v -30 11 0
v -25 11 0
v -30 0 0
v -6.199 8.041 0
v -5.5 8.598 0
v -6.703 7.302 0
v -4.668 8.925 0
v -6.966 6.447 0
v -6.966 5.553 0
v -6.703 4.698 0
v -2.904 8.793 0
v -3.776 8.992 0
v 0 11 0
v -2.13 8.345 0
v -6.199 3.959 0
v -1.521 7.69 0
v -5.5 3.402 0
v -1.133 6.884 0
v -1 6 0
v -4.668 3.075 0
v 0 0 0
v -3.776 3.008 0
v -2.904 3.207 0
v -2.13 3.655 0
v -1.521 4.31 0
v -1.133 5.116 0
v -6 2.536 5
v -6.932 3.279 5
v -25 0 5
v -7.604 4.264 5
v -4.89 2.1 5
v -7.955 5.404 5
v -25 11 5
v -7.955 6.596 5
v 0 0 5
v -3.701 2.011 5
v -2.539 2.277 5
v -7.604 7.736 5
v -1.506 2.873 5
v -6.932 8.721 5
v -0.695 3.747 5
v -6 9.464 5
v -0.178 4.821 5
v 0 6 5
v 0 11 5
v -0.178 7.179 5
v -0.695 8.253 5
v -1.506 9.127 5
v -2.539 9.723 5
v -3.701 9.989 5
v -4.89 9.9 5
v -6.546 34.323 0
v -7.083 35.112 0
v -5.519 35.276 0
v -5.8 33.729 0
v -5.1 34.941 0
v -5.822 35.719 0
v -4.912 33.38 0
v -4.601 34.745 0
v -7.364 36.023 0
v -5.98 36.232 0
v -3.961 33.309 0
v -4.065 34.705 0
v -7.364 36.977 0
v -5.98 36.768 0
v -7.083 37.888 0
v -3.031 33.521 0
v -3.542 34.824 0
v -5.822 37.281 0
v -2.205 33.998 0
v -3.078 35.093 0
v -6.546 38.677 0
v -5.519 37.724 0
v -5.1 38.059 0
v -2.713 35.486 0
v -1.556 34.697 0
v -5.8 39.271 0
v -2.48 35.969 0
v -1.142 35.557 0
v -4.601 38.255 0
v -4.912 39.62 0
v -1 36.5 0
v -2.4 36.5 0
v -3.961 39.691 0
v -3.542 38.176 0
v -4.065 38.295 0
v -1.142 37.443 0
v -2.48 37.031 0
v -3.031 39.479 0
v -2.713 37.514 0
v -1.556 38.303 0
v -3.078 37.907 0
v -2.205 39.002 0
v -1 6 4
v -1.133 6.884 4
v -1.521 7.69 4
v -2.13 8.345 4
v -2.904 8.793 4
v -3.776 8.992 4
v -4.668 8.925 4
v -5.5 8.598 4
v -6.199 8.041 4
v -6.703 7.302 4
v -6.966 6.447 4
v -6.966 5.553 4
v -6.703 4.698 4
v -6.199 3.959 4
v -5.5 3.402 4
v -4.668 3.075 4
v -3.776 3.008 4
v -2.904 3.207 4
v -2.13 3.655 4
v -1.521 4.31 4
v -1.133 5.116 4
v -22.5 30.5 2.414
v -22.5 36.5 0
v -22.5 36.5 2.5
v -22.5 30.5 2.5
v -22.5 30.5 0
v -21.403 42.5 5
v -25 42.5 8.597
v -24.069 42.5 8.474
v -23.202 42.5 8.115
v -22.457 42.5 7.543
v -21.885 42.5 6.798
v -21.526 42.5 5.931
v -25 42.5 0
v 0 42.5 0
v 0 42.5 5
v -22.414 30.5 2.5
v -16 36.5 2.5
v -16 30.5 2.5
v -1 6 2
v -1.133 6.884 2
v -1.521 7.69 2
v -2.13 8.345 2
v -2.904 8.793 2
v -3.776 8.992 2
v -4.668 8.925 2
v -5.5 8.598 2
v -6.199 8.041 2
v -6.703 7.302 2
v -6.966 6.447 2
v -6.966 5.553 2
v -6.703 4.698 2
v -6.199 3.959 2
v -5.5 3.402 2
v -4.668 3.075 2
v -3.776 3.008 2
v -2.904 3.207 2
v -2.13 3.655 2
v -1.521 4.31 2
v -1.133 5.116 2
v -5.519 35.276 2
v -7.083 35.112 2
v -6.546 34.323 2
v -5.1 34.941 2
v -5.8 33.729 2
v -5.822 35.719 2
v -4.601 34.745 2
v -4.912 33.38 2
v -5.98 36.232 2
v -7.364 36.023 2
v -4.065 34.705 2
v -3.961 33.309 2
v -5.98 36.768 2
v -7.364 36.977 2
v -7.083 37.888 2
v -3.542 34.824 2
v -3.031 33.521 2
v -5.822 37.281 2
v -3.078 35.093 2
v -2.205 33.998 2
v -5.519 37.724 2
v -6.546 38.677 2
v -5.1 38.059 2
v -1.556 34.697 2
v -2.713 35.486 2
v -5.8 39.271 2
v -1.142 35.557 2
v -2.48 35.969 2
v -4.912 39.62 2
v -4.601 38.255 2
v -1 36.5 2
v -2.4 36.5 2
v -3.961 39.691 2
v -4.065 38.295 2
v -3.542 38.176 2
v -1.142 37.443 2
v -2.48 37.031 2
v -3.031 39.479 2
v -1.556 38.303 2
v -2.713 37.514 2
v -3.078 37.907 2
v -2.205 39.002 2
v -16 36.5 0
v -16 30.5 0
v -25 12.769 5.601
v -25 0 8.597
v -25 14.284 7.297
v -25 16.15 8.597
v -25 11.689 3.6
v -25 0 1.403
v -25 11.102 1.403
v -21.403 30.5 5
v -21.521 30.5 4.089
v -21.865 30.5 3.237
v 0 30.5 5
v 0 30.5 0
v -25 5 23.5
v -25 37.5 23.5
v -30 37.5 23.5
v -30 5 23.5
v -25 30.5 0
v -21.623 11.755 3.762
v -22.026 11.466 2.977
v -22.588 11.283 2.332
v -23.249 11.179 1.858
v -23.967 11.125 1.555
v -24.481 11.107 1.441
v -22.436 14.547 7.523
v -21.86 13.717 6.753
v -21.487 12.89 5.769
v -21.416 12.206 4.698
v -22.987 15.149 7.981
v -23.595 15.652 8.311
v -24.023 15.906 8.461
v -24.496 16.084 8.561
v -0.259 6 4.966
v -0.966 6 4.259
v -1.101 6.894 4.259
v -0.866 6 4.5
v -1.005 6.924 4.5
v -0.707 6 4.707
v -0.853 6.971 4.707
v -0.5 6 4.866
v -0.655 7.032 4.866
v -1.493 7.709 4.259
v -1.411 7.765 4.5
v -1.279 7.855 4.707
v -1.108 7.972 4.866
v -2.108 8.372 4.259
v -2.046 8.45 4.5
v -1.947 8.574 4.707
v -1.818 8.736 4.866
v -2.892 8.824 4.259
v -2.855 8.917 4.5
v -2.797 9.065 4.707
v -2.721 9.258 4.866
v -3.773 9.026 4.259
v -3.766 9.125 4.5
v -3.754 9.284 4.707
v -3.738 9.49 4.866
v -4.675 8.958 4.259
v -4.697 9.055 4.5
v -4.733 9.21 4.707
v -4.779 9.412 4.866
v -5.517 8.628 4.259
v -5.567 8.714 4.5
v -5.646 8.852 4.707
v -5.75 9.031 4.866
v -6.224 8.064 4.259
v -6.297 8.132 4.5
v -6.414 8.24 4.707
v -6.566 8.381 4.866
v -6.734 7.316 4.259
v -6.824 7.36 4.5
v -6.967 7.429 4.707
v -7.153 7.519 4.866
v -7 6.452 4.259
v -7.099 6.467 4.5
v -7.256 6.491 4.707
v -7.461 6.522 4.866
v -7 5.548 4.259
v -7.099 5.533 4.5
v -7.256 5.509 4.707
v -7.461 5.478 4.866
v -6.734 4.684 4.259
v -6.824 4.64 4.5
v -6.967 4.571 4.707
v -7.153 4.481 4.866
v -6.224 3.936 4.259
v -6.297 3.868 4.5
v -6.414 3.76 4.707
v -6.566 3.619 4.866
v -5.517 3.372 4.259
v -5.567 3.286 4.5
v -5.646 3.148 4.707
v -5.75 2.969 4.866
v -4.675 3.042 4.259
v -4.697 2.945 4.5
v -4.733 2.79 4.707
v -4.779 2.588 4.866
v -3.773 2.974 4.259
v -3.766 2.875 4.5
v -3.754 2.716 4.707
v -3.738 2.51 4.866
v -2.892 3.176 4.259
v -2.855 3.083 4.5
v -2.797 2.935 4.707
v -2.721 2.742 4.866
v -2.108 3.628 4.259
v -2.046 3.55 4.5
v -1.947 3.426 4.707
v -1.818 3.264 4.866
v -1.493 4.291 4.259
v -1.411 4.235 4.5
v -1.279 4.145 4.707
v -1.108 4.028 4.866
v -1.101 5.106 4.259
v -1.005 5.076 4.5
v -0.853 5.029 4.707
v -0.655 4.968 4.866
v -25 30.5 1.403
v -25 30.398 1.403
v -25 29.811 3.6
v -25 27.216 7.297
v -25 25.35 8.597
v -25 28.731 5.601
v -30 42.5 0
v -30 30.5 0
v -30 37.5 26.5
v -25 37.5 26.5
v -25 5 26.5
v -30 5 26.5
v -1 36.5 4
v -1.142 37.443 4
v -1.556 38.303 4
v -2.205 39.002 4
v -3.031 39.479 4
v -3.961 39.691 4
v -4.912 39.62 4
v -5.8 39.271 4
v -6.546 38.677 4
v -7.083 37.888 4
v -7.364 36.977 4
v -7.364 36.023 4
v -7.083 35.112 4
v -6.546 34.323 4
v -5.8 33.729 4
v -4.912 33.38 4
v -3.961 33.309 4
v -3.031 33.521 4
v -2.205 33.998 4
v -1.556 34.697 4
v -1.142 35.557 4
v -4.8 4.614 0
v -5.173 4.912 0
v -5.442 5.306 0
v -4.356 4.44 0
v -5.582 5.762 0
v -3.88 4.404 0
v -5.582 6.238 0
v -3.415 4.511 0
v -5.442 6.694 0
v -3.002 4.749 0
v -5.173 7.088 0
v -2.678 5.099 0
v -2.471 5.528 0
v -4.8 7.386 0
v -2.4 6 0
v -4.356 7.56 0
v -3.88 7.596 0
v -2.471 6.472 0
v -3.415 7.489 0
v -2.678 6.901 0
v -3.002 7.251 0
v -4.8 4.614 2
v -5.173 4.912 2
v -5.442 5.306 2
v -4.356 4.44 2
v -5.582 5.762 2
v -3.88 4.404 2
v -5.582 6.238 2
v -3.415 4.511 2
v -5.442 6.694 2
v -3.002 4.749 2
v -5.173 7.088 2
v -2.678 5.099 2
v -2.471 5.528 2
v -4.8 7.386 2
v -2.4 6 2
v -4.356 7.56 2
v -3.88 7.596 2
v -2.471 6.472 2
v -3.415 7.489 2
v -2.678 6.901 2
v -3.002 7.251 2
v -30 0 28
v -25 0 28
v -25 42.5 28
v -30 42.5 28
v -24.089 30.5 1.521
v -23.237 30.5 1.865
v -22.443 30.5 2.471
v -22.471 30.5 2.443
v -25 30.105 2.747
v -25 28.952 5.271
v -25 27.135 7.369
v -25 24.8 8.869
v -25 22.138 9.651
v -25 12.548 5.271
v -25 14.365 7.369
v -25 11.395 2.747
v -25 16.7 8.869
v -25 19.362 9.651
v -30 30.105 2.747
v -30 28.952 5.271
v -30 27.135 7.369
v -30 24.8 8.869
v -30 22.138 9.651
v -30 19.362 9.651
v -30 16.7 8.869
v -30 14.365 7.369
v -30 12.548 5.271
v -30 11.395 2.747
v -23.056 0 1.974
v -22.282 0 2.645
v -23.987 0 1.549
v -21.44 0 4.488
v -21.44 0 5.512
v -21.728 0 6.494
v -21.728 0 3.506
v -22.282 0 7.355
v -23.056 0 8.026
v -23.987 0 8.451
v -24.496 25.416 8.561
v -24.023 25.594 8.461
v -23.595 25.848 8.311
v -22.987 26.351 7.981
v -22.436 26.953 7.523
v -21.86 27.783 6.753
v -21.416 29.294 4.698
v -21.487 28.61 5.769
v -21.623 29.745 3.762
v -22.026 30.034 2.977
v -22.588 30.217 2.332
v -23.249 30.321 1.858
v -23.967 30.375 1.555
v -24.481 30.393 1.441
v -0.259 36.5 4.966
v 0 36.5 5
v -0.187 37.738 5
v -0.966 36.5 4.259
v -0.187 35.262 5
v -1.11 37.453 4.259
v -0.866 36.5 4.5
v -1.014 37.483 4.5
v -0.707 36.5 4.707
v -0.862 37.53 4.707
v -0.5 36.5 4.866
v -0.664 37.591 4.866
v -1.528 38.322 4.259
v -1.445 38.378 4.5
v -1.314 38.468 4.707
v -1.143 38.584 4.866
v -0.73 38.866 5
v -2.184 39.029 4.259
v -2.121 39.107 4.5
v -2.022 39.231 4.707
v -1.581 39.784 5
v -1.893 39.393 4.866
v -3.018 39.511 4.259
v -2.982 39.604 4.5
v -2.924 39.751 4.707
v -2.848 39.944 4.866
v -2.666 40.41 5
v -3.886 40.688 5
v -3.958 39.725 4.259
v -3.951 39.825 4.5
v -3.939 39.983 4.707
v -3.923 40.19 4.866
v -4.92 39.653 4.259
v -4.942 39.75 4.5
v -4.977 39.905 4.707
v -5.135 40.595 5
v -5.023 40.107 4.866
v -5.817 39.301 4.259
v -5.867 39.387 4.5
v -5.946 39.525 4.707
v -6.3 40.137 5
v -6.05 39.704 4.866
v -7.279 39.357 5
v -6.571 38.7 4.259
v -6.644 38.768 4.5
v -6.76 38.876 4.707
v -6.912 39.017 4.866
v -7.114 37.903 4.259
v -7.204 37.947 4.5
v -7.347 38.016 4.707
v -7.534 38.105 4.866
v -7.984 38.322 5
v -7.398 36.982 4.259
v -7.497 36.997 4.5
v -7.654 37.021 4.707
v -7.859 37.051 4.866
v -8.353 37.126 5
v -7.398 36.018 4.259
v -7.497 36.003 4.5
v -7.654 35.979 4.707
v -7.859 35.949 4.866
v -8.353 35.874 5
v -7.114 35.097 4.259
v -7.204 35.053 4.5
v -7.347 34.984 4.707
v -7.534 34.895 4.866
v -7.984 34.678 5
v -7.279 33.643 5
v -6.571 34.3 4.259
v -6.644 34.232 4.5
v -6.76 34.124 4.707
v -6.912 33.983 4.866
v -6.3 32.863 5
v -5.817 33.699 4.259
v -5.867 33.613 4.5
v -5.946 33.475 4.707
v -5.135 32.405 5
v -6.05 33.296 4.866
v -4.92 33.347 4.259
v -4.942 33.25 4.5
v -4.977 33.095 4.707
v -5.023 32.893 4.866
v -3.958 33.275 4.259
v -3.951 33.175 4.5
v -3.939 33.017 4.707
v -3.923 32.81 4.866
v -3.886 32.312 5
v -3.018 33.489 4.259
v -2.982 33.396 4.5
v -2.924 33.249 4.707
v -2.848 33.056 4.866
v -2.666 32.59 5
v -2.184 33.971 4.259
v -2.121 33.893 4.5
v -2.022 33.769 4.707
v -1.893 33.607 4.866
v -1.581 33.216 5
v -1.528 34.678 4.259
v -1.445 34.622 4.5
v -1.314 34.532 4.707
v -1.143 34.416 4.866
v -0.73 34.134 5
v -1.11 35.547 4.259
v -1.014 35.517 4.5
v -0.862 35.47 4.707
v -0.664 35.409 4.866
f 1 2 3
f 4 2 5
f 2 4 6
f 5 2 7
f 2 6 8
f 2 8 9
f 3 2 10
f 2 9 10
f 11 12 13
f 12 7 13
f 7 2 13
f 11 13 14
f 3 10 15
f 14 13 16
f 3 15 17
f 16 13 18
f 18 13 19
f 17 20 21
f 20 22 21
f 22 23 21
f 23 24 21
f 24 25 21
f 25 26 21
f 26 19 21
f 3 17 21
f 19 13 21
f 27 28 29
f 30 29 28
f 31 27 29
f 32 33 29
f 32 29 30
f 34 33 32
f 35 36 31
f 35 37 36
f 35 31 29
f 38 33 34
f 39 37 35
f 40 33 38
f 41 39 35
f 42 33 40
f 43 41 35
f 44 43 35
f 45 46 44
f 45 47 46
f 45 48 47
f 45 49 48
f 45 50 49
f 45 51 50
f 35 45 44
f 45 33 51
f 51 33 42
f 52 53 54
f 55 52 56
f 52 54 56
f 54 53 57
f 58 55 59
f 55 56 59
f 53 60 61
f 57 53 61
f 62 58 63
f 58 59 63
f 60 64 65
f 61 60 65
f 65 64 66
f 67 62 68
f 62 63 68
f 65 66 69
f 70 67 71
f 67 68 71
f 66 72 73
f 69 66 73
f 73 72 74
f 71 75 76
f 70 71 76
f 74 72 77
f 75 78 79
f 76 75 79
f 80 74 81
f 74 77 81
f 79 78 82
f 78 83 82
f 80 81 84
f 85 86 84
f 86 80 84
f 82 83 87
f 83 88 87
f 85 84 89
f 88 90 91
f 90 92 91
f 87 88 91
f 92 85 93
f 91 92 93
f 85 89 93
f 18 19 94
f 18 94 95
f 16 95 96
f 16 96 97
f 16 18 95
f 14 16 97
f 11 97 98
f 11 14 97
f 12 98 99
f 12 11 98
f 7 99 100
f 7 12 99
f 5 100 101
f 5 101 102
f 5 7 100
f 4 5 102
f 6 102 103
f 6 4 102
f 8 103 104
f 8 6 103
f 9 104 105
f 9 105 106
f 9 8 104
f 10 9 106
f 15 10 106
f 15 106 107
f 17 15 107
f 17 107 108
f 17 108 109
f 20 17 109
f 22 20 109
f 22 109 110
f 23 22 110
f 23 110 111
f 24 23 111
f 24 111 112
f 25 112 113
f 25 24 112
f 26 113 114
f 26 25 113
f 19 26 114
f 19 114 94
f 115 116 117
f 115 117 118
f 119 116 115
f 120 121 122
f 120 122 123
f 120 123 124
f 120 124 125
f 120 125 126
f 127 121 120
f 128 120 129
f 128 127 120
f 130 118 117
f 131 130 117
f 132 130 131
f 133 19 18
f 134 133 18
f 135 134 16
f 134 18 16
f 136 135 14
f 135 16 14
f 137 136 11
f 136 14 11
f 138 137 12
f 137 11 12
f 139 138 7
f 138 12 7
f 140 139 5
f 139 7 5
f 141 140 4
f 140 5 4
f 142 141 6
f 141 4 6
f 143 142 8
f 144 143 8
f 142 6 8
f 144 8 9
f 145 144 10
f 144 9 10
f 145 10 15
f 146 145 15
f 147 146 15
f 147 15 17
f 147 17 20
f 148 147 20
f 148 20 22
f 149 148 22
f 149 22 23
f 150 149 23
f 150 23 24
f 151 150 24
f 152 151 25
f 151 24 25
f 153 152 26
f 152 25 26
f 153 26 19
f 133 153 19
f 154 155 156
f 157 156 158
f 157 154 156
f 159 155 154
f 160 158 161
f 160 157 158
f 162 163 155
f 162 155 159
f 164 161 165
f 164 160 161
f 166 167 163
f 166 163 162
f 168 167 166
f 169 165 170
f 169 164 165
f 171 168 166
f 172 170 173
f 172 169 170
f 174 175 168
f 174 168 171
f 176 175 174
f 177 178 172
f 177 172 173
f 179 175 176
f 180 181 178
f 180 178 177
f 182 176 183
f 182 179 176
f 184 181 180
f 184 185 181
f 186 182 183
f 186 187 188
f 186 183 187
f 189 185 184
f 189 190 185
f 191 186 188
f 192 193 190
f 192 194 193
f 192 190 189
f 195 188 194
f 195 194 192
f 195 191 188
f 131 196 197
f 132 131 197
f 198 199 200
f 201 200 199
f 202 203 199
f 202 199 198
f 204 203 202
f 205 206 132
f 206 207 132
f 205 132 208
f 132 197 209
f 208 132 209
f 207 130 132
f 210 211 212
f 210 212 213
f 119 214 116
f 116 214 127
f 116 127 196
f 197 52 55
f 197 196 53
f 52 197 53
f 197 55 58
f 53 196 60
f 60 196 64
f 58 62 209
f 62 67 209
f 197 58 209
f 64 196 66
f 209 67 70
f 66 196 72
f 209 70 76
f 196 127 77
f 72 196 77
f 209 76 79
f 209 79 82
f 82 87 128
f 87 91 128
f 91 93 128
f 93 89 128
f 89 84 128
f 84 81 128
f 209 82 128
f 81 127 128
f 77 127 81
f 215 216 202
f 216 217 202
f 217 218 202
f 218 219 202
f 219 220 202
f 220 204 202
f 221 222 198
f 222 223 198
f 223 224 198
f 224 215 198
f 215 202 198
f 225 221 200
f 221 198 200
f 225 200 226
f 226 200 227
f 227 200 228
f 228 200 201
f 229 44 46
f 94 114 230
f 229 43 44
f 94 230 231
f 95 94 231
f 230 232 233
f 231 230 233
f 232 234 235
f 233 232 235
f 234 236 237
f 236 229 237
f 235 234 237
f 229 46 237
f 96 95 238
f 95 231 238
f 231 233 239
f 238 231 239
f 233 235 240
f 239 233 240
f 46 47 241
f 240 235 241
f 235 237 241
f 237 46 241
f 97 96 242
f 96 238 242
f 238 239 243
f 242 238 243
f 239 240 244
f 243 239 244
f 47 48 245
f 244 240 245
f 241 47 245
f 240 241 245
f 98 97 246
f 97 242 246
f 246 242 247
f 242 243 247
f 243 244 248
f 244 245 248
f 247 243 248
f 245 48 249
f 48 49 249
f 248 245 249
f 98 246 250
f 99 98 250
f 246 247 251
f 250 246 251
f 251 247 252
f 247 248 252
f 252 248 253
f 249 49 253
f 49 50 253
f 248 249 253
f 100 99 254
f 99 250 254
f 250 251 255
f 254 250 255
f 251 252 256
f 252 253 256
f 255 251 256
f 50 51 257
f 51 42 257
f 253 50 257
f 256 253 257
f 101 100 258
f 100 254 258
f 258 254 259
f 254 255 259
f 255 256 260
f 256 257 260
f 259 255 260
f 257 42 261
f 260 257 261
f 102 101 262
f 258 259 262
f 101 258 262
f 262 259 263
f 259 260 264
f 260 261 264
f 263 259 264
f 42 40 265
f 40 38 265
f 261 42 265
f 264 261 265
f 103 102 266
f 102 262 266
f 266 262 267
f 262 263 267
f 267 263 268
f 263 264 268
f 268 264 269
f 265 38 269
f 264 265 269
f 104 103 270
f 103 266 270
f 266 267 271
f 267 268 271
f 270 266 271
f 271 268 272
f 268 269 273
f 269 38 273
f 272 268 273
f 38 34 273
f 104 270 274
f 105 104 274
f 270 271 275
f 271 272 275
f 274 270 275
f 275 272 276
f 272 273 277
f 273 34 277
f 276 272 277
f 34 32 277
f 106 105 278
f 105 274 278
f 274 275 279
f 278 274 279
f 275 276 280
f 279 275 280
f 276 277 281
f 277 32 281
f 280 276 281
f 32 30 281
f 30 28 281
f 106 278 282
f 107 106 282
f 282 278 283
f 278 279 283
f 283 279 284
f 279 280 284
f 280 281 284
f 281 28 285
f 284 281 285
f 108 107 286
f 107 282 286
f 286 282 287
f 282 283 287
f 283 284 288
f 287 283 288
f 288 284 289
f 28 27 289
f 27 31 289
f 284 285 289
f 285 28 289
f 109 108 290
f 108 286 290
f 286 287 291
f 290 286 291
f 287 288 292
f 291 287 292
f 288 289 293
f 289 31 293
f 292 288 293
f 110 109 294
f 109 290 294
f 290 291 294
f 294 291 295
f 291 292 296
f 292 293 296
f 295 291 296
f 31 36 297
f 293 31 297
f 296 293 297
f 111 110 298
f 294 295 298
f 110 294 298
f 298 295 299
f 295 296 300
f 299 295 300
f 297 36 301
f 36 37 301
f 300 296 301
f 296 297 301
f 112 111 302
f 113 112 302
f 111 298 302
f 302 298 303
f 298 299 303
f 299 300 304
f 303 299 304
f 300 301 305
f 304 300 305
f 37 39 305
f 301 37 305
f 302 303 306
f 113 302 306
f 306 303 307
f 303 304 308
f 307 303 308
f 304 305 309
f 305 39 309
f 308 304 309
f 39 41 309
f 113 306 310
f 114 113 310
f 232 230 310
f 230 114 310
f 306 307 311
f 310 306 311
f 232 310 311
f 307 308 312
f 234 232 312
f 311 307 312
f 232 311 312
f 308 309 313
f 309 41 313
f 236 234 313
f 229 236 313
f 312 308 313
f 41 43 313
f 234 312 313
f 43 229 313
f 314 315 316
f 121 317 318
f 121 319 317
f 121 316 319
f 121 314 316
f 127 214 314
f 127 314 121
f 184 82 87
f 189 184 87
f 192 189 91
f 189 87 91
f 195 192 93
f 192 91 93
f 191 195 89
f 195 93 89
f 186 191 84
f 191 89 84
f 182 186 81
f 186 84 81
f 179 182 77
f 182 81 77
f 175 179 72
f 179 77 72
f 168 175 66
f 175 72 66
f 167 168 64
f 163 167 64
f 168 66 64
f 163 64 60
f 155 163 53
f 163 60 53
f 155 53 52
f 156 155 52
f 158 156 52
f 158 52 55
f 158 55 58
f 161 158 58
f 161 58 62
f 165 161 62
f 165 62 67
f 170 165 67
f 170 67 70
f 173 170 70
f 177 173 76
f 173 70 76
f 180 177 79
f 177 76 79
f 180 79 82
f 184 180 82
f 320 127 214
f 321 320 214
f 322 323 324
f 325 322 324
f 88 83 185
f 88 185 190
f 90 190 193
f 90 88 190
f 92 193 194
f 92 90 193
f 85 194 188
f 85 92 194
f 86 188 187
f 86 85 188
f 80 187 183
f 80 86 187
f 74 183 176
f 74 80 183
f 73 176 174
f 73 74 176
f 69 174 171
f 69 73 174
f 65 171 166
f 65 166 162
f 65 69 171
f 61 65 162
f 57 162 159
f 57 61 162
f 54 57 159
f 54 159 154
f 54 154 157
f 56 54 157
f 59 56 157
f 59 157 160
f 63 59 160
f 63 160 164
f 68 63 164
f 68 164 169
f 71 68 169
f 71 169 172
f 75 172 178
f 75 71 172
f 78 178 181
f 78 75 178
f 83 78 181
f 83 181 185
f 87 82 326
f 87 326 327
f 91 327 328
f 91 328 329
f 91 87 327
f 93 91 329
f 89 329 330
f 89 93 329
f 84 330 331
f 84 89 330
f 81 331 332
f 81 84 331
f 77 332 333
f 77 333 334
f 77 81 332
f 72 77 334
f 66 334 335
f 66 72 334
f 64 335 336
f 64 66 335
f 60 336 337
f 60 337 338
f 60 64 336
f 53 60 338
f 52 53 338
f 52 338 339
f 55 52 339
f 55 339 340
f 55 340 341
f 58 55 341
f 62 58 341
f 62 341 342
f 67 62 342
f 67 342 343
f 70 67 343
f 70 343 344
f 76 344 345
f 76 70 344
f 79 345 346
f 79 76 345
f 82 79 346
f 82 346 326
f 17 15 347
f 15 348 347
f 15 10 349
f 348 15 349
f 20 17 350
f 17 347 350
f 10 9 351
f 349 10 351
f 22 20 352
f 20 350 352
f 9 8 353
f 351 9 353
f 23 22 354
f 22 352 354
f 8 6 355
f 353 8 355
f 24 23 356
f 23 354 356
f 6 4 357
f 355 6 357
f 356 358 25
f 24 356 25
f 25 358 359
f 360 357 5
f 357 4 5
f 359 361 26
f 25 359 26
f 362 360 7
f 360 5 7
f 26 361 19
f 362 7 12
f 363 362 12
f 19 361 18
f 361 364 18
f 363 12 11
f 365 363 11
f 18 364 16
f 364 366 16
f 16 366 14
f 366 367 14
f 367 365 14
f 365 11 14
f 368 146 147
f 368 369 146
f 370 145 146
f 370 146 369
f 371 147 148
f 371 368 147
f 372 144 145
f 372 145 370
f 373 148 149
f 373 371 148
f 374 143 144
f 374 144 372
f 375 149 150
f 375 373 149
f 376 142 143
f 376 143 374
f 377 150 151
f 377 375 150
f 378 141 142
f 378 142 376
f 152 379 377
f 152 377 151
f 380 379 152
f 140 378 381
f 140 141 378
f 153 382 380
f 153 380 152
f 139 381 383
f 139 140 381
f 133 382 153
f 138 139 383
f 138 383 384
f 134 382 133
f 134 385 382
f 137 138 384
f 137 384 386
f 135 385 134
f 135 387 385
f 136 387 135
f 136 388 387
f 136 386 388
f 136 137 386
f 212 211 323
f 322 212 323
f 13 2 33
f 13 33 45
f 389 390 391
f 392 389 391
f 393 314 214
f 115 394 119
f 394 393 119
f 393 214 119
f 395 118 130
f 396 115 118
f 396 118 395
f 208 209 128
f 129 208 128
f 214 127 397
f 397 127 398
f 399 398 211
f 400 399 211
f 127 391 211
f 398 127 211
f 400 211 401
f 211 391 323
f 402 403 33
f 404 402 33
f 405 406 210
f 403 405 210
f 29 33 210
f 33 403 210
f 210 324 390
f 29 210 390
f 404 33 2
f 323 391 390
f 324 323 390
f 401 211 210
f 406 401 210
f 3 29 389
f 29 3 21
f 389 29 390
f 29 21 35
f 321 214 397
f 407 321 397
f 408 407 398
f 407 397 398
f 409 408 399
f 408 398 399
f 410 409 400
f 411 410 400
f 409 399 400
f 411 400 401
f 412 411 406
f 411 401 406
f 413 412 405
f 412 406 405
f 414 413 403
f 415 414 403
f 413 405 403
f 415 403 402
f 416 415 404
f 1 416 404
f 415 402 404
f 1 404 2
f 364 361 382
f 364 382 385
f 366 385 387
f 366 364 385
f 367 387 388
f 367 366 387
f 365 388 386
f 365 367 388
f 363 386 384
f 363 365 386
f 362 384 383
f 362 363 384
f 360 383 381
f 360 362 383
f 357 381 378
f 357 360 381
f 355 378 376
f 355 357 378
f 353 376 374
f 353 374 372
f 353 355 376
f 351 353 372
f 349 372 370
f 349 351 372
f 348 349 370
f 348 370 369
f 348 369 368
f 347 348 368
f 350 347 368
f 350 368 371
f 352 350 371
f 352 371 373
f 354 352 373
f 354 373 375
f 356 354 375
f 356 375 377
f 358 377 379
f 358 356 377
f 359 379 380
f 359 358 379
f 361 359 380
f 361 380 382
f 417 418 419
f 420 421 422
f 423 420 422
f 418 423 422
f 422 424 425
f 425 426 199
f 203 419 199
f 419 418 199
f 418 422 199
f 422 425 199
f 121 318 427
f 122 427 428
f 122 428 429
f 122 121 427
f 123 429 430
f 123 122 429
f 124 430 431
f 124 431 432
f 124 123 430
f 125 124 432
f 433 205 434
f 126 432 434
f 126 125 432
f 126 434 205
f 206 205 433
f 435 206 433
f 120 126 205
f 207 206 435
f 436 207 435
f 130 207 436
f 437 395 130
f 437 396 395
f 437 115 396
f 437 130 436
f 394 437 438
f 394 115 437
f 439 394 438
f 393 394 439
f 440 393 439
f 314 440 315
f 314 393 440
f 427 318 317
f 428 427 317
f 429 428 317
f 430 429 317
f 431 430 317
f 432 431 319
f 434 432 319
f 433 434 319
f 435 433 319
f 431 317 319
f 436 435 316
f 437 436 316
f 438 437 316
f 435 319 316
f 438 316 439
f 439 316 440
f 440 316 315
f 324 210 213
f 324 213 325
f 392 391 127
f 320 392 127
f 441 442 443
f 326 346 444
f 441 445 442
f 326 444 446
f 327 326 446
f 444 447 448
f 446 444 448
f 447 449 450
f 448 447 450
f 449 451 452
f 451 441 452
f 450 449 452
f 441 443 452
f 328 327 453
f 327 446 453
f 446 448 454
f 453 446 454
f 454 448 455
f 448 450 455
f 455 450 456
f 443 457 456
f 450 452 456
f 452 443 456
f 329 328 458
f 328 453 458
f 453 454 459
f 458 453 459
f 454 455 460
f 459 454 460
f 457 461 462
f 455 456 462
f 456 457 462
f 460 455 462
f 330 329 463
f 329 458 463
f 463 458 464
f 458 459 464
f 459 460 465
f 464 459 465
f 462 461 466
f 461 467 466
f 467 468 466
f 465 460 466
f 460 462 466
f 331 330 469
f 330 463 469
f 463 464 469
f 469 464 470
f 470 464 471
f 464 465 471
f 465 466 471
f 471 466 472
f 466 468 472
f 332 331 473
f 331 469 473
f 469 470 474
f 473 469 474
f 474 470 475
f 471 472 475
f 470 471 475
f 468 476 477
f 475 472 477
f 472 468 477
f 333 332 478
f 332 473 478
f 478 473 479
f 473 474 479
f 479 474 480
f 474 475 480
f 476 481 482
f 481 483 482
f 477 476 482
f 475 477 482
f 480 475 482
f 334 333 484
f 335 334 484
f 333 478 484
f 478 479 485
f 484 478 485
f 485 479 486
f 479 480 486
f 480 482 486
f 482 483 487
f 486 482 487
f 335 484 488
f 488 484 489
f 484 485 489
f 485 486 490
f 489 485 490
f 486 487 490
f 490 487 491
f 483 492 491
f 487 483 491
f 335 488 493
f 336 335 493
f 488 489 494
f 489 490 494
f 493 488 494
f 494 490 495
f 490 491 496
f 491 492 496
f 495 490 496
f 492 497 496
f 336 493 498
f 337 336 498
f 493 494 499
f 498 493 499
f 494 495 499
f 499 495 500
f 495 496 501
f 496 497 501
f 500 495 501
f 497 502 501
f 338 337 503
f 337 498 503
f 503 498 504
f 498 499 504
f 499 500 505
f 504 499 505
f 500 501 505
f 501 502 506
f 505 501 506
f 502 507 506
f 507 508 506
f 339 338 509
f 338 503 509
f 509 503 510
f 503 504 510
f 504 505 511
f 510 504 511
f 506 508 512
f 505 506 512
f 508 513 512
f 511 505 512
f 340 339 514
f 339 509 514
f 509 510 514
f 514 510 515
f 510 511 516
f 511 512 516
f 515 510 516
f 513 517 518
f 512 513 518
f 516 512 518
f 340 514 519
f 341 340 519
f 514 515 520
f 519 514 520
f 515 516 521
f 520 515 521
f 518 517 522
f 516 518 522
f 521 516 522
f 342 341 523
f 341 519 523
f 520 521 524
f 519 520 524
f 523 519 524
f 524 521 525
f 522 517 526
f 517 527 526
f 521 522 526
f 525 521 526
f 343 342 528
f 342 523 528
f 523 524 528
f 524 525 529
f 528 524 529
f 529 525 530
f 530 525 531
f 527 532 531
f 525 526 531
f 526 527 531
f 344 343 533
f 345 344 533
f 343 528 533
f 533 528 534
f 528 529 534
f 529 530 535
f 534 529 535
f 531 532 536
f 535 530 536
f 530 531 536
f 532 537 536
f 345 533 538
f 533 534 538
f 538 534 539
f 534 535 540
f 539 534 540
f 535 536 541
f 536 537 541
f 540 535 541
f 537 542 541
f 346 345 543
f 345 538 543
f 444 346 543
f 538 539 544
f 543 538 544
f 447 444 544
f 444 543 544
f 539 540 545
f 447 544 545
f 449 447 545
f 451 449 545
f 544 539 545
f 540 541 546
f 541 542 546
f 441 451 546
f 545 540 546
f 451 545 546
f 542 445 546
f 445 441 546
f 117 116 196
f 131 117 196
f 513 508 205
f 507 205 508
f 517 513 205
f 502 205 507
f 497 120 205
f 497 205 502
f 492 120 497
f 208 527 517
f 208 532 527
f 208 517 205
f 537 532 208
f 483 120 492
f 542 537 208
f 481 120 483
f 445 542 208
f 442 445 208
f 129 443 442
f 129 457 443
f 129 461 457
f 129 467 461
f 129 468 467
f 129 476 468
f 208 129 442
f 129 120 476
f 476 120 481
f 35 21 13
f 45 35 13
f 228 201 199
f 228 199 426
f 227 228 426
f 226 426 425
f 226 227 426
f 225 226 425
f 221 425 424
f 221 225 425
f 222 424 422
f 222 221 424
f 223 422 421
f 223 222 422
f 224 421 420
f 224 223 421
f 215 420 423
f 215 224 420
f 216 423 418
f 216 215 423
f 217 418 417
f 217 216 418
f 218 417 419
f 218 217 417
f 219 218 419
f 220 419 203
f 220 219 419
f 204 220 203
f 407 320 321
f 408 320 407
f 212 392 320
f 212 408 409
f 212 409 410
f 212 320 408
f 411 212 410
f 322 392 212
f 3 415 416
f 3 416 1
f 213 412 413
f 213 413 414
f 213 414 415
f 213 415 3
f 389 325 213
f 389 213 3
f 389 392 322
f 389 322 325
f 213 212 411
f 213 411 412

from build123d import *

# Parameters (mm, degrees)
F0_W     = 25
F0_H     = 12
F0_R     = 3.2
F1_DEPTH = 5
F0_H_2   = 11
F0_R_2   = 3
F2_W     = 32.5
F2_H     = 3
F2_W_2   = 12
F2_H_2   = 5
F3_DEPTH = 5
F5_DEPTH = 42.5
F6_W     = 6.5
F6_H     = 6
F7_DEPTH = 2.5
F8_DEPTH = 25
F0_R_3   = 1.6
F9_DEPTH = 2
F0_R_4   = 1.8
F10_R    = 0.99999
F10_2_R  = 0.99999


# Not quite as in the source:
# - a fillet or chamfer is up to 0.001 mm smaller than in the source, because OpenCascade refuses the exact size


with BuildPart() as f1:
    # F0 (on Top) → F1 (new body)
    with BuildSketch(Plane.XY):
        with Locations((-12.5, 36.5)):
            Rectangle(F0_W, F0_H)
        with Locations((-4.2, 36.5)):
            Circle(F0_R, mode=Mode.SUBTRACT)
    extrude(amount=F1_DEPTH)

    # F4 (on face) → F5 (join, through all)
    with BuildSketch(Plane(origin=(0, 42.5, 0), x_dir=(-1, 0, 0), z_dir=(0, 1, 0))):
        with BuildLine():
            Line((25, 1.4033576227), (25, 8.5966423773))
            ThreePointArc((25, 8.5966423773), (21.4033576227, 5), (25, 1.4033576227))
        make_face()
    extrude(amount=-F5_DEPTH)

    # F6 (on face) → F7 (cut)
    with BuildSketch(Plane(origin=(0, 0, 0), x_dir=(1, 0, 0), z_dir=(0, 0, -1))):
        with Locations((-19.25, -33.5)):
            Rectangle(F6_W, F6_H)
    extrude(amount=-F7_DEPTH, mode=Mode.SUBTRACT)

    # F2 (on face) → F8 (cut)
    with BuildSketch(Plane(origin=(-25, 0, 0), x_dir=(0, -1, 0), z_dir=(-1, 0, 0))):
        with BuildLine():
            Line((-30.5, 0), (-11, 0))
            ThreePointArc((-11, 0), (-20.75, 9.75), (-30.5, 0))
        make_face()
    extrude(amount=-F8_DEPTH, mode=Mode.SUBTRACT)

    # F10 (radius 1 in the source; OpenCascade refuses exactly that, so slightly less here)
    f10_edges = [f1.edges().sort_by_distance(p)[0] for p in [
        (-7.4, 36.5, 5),
    ]]
    fillet(f10_edges, radius=F10_R)


with BuildPart() as f1b:
    # F0 (on Top) → F1, piece 2 (new body)
    with BuildSketch(Plane.XY):
        with Locations((-12.5, 5.5)):
            Rectangle(F0_W, F0_H_2)
        with Locations((-4, 6)):
            Circle(F0_R_2, mode=Mode.SUBTRACT)
    extrude(amount=F1_DEPTH)

    # F2 (on face) → F3 (join)
    with BuildSketch(Plane(origin=(-25, 0, 0), x_dir=(0, -1, 0), z_dir=(-1, 0, 0))):
        with BuildLine():
            Line((-11, 0), (0, 0))
            Line((0, 0), (0, 28))
            Line((0, 28), (-42.5, 28))
            Line((-42.5, 28), (-42.5, 5))
            Line((-42.5, 5), (-30.5, 5))
            Line((-30.5, 5), (-30.5, 0))
            ThreePointArc((-30.5, 0), (-20.75, 9.75), (-11, 0))
        make_face()
        with Locations((-21.25, 25)):
            Rectangle(F2_W, F2_H, mode=Mode.SUBTRACT)
        with Locations((-36.5, 2.5)):
            Rectangle(F2_W_2, F2_H_2)
    extrude(amount=F3_DEPTH)

    # F10#2 (radius 1 in the source; OpenCascade refuses exactly that, so slightly less here)
    f10_2_edges = [f1b.edges().sort_by_distance(p)[0] for p in [
        (-7, 6, 5),
    ]]
    fillet(f10_2_edges, radius=F10_2_R)


with BuildPart() as f9:
    # F0 (on Top) → F9 (new body)
    with BuildSketch(Plane.XY):
        with Locations((-4, 6)):
            Circle(F0_R_2)
        with Locations((-4, 6)):
            Circle(F0_R_3, mode=Mode.SUBTRACT)
    extrude(amount=F9_DEPTH)


with BuildPart() as f9b:
    # F0 (on Top) → F9, piece 2 (new body)
    with BuildSketch(Plane.XY):
        with Locations((-4.2, 36.5)):
            Circle(F0_R)
        with Locations((-4.2, 36.5)):
            Circle(F0_R_4, mode=Mode.SUBTRACT)
    extrude(amount=F9_DEPTH)


solid = Compound([f1.part, f1b.part, f9.part, f9b.part])
